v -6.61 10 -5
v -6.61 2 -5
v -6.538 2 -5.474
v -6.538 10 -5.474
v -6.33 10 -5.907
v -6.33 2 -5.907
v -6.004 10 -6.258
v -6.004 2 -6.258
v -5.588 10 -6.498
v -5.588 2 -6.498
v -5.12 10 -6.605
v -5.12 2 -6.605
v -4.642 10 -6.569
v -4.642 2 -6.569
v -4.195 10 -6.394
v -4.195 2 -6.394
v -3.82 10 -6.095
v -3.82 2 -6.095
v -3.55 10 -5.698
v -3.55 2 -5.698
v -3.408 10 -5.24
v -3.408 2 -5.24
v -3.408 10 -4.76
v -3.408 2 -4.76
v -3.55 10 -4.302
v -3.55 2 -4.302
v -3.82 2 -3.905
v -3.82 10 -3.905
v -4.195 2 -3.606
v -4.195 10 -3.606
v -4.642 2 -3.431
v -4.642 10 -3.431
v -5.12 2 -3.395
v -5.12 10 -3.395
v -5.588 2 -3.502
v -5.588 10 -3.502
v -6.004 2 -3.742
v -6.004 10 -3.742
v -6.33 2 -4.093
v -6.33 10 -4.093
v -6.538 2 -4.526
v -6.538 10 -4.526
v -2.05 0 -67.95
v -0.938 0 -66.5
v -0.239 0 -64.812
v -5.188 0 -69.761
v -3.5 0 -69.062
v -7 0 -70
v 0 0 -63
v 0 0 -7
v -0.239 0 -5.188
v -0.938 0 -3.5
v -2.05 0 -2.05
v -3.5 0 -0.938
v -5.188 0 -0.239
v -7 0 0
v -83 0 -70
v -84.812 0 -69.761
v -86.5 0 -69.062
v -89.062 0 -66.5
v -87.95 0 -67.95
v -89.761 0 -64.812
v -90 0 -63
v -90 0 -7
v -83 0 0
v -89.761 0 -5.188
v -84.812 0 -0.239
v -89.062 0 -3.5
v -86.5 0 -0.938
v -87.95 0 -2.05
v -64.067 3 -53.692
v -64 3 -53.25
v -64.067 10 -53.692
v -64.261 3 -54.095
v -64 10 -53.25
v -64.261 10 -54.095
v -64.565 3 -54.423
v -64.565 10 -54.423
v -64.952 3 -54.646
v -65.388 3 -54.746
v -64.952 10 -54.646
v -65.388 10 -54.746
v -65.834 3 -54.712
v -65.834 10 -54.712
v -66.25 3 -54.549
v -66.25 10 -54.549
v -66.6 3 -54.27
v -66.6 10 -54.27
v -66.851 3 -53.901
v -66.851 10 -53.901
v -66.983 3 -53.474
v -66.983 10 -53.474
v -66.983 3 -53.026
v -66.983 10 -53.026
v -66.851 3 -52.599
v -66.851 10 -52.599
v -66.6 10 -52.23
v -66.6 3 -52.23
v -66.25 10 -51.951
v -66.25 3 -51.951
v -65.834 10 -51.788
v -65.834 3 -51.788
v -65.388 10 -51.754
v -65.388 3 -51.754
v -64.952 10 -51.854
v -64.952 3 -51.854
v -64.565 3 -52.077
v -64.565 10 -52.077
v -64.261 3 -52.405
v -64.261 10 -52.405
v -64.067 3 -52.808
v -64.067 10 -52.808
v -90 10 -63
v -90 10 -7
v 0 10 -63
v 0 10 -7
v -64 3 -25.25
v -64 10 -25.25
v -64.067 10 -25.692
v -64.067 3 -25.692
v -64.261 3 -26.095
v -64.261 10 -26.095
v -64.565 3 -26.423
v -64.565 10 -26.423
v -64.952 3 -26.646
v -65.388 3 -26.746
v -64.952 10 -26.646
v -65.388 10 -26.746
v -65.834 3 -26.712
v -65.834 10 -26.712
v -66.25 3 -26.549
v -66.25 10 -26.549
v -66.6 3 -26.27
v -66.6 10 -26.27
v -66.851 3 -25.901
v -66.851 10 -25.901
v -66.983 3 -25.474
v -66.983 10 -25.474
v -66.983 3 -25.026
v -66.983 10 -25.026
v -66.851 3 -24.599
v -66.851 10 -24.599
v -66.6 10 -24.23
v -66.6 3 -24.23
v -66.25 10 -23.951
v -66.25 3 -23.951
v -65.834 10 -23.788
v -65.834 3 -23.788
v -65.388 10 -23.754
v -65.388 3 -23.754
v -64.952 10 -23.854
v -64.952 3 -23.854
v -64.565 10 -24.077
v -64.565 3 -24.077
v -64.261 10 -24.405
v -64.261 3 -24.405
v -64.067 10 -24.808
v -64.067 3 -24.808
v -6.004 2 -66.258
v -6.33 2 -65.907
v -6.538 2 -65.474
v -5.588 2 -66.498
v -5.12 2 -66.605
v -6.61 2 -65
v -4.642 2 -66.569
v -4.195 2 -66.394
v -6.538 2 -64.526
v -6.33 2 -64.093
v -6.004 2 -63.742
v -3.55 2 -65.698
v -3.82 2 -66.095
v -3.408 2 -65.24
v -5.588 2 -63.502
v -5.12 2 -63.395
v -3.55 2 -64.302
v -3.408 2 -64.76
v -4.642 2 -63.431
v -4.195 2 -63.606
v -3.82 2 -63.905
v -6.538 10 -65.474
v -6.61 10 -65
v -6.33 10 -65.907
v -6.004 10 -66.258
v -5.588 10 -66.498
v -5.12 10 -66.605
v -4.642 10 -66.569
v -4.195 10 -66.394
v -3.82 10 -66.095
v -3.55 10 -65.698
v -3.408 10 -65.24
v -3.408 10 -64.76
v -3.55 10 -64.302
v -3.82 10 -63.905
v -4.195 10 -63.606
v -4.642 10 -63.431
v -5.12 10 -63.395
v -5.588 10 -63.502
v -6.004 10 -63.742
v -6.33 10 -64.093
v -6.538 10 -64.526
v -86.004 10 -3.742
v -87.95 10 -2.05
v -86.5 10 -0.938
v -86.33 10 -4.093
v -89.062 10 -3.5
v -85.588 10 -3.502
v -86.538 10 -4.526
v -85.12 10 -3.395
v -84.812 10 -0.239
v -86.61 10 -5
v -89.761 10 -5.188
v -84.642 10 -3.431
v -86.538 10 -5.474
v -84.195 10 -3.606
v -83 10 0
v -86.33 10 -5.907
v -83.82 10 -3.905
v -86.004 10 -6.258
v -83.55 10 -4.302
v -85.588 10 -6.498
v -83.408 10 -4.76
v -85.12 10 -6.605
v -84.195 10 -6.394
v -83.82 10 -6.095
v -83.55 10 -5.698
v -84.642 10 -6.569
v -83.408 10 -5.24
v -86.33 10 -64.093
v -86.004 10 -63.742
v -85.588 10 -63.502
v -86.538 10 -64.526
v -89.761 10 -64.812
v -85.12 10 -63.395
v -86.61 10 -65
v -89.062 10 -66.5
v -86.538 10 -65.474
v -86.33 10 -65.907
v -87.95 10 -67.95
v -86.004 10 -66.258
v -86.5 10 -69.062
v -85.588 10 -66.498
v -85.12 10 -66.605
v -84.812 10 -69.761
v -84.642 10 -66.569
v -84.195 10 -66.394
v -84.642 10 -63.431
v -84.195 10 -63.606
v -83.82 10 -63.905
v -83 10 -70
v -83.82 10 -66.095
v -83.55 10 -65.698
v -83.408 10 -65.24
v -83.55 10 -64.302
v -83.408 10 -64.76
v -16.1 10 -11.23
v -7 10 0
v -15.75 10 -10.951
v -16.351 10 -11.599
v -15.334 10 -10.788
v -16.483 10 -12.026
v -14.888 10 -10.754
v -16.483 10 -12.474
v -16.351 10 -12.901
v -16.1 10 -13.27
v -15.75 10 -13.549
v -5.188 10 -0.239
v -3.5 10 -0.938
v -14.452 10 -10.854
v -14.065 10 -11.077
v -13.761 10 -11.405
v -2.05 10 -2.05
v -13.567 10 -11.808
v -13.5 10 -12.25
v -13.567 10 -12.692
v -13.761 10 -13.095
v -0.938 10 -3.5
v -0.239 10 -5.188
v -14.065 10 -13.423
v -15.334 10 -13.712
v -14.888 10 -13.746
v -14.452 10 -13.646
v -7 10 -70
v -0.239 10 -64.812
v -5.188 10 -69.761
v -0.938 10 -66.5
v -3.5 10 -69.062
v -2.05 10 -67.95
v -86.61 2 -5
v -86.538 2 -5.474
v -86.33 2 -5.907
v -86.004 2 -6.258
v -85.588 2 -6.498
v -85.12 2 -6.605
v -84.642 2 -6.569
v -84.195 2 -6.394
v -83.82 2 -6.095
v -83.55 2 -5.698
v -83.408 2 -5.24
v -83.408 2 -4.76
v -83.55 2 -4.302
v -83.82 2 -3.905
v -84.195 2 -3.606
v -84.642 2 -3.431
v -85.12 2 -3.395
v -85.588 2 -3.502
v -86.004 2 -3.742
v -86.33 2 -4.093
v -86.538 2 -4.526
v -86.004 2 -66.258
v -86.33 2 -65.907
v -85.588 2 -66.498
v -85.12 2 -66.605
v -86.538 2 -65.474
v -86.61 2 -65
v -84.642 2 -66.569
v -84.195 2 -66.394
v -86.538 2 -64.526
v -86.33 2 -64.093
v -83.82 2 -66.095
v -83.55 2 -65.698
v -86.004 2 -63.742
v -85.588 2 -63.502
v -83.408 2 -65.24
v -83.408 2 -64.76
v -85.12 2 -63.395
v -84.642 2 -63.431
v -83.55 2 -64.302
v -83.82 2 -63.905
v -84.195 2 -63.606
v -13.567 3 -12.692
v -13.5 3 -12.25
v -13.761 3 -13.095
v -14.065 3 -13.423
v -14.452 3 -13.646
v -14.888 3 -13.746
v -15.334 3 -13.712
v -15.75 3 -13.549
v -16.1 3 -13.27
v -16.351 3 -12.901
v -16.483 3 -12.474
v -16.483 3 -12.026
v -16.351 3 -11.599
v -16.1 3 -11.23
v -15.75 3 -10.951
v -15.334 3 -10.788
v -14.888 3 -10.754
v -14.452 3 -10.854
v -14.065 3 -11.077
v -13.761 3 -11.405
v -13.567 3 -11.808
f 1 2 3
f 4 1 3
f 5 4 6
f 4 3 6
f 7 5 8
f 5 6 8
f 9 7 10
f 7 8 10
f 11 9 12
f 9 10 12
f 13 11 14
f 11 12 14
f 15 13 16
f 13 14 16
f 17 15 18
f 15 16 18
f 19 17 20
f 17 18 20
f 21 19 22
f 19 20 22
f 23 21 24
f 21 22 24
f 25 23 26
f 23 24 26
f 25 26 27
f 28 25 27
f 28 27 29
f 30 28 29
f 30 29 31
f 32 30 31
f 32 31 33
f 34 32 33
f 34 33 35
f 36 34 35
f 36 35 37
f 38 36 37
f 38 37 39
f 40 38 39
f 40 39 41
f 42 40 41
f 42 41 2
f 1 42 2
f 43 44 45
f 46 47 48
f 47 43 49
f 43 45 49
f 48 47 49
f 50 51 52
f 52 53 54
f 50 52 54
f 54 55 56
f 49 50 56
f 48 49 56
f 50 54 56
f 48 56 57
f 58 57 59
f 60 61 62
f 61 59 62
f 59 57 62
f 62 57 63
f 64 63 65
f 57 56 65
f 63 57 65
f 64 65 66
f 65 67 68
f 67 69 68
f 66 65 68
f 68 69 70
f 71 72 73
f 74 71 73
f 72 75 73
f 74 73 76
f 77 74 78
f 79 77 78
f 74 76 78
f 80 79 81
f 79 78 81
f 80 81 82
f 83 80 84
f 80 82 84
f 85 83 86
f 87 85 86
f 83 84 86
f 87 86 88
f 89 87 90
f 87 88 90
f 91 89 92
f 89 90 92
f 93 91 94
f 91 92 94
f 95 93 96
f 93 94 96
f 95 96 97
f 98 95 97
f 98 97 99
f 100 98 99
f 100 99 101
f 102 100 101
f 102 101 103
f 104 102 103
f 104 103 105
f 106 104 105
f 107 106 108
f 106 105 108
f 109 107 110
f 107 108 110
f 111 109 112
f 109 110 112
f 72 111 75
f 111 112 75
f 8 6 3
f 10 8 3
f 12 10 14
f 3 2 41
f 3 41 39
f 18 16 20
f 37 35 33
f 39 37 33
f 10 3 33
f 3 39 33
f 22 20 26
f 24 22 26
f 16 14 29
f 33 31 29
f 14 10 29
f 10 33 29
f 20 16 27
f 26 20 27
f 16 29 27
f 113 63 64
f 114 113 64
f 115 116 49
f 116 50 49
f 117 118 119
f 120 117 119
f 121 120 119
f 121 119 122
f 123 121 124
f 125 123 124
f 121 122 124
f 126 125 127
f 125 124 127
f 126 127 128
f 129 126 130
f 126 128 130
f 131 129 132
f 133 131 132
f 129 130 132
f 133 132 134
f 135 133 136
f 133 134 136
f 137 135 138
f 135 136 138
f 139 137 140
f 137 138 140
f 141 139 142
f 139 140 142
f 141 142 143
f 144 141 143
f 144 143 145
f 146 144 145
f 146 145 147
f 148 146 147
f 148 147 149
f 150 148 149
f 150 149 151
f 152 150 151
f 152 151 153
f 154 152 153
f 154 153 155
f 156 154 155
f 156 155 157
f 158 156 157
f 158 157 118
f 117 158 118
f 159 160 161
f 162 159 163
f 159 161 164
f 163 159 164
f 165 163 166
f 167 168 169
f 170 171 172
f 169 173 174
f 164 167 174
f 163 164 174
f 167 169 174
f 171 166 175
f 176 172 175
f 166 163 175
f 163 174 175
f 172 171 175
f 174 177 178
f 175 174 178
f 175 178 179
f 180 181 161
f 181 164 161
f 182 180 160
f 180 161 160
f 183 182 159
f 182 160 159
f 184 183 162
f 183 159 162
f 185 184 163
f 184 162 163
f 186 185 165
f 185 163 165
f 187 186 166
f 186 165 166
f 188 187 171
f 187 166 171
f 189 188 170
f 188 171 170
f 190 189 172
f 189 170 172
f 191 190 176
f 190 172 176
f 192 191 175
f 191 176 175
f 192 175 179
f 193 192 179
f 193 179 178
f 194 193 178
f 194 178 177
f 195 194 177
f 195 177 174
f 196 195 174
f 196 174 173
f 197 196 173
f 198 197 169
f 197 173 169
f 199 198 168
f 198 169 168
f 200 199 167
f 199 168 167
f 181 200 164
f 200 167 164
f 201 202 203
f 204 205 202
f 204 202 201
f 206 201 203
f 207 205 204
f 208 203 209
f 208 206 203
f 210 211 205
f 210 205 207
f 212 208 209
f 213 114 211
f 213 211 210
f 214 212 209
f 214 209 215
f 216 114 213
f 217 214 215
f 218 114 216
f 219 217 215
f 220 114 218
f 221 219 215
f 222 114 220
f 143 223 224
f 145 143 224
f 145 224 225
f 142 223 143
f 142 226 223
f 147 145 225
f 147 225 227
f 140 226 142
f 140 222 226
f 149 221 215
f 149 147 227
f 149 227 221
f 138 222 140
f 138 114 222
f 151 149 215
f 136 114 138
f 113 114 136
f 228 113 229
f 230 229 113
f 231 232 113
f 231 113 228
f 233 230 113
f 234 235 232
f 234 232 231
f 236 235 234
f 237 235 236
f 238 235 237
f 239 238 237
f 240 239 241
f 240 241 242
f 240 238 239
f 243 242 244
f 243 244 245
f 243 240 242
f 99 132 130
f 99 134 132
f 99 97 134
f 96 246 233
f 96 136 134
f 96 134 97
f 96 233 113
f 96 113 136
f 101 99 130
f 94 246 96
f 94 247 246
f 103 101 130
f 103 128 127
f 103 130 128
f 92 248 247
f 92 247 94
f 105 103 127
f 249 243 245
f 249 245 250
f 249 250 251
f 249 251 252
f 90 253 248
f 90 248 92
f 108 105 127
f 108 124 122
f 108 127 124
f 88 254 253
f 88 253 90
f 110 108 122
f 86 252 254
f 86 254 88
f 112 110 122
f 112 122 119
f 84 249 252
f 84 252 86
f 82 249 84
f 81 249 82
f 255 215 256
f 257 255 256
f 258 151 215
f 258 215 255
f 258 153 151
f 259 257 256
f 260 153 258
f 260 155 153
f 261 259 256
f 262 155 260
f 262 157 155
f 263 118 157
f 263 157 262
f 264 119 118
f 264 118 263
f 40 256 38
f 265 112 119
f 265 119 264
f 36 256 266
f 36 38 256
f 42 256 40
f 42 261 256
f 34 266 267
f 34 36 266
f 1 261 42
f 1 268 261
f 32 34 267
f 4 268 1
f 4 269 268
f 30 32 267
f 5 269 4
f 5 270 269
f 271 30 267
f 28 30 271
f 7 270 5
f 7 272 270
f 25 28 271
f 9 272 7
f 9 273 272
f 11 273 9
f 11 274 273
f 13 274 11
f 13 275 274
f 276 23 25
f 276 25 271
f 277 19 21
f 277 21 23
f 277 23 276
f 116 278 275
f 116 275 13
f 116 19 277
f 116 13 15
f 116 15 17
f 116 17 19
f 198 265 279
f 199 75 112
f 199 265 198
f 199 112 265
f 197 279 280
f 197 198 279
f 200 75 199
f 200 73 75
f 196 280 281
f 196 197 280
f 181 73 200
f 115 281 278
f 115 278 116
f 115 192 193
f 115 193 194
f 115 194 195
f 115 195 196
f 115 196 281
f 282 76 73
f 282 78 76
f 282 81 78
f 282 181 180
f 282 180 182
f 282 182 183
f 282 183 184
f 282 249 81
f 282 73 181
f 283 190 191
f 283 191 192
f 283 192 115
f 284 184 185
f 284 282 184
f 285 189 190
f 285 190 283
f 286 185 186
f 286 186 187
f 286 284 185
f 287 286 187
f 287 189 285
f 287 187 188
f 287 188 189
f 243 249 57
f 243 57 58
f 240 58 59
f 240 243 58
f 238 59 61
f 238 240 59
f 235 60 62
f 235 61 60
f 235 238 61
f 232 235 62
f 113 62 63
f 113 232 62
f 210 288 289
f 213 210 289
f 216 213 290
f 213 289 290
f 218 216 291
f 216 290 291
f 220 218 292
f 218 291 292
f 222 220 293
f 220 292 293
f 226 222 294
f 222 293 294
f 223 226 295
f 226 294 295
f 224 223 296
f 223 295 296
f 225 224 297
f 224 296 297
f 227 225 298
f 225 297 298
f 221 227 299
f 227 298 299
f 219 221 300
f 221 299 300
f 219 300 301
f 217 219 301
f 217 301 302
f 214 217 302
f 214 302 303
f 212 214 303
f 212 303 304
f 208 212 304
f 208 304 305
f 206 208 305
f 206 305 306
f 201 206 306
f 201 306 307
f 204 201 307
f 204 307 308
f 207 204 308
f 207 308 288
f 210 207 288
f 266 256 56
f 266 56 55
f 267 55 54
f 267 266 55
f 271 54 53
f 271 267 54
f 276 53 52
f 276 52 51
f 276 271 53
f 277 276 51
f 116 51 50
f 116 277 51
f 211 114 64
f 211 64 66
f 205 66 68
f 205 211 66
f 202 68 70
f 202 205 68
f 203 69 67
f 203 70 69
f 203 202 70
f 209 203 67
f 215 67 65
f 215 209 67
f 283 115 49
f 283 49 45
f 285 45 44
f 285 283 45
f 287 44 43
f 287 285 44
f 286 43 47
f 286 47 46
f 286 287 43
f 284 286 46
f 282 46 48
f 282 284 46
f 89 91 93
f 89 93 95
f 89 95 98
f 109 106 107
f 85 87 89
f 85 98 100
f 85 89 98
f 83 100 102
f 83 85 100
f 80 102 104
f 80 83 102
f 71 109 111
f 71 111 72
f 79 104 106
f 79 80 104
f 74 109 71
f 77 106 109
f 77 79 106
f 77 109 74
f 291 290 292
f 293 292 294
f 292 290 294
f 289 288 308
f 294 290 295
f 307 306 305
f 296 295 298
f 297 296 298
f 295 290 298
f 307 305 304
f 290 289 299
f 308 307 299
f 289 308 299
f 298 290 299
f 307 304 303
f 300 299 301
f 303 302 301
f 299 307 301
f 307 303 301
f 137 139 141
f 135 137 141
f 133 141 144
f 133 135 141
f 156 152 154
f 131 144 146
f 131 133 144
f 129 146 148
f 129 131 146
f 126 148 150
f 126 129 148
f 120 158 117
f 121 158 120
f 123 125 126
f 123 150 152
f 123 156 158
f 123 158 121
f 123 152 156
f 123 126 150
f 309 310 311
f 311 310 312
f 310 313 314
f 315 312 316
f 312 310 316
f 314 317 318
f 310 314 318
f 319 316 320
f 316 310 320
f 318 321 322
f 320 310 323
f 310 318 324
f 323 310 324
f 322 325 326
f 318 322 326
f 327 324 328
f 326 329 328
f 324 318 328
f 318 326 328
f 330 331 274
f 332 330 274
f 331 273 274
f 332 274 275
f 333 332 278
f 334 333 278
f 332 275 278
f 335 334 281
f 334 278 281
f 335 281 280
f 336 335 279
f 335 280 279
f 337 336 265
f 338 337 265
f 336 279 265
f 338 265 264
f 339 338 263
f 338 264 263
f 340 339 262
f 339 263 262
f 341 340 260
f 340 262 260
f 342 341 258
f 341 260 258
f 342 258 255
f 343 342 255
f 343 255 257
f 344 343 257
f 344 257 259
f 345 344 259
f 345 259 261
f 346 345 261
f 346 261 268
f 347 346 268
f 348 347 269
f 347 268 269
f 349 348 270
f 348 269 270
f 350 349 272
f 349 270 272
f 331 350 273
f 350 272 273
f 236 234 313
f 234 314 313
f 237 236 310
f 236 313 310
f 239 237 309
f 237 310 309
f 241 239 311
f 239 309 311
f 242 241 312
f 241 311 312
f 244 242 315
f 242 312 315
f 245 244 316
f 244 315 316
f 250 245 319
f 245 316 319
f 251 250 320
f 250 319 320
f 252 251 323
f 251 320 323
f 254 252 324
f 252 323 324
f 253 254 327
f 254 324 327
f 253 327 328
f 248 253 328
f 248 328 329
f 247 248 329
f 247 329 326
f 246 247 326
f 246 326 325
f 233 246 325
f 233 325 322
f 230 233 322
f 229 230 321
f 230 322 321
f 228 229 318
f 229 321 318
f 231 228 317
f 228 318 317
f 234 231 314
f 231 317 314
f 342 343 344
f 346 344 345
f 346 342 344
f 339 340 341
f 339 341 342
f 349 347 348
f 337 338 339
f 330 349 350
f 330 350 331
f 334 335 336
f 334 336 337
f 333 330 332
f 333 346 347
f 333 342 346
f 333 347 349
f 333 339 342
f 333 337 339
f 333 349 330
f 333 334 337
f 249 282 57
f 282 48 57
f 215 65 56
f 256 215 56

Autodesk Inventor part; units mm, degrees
ref_plane "YZ Plane" through (0, 0, 0) normal (1, 0, 0) x (0, 1, 0)
ref_plane "XZ Plane" through (0, 0, 0) normal (0, 1, 0) x (-1, 0, 0)
ref_plane "XY Plane" through (0, 0, 0) normal (0, 0, 1) x (1, 0, 0)
sketch "Sketch1" plane through (0, 0, 0) normal (0, 1, 0) x (-1, 0, 0)
  line L0 (0, 0) -> (0, -70)
  line L1 (0, -70) -> (90, -70)
  line L2 (90, -70) -> (90, 0)
  line L3 (90, 0) -> (0, 0)
  circle A0 centre (85, -65) radius 1.6095
  circle A1 centre (85, -5) radius 1.6095
  circle A2 centre (85, -5) radius 1.6095
  circle A3 centre (85, -65) radius 1.6095
  circle A4 centre (5, -65) radius 1.6095
  circle A5 centre (5, -5) radius 1.6095
  circle A6 centre (5, -65) radius 1.6095
  circle A7 centre (5, -5) radius 1.6095
  dimension "d0" = 70
  dimension "d1" = 90
  dimension "d5" = 5
  dimension "d6" = 3.2191
extrude "Extrusion1" add sketch "Sketch1" along normal blind 15
sketch "Sketch2" plane through (0, 15, 0) normal (0, 1, 0) x (1, 0, 0)
  line L0 (-90, 70) -> (-90, 0) projected
  line L1 (-90, 0) -> (0, 0) projected
  line L2 (-90, 0) -> (0, 0)
  line L3 (0, 70) -> (-90, 70) projected
  line L4 (0, 0) -> (0, 70)
  line L5 (0, 70) -> (-90, 70)
  line L6 (-90, 70) -> (-90, 0)
extrude "Extrusion2" cut sketch "Sketch2" against normal blind 5
fillet "Fillet1" radius 7 4 edges at (-90, 5, -70) (-90, 5, 0) (0, 5, -70) (0, 5, 0)
sketch "Sketch3" plane through (0, 0, 0) normal (0, -1, 0) x (1, 0, 0)
  circle A0 centre (-85, -65) radius 1.6095 projected
  circle A1 centre (-85, -65) radius 1.6095
  circle A2 centre (-85, -5) radius 1.6095 projected
  circle A3 centre (-85, -5) radius 1.6095
  circle A4 centre (-5, -5) radius 1.6095 projected
  circle A5 centre (-5, -5) radius 1.6095
  circle A6 centre (-5, -65) radius 1.6095 projected
  circle A7 centre (-5, -65) radius 1.6095
  point P0 (0, 0)
extrude "Extrusion3" add sketch "Sketch3" against normal blind 2
sketch "Sketch4" plane through (0, 10, 0) normal (0, 1, 0) x (1, 0, 0)
  point P0 (0, 0)
sketch "Sketch5" plane through (0, 10, 0) normal (0, 1, 0) x (1, 0, 0)
  circle A0 centre (-15, 12.25) radius 1.5
  circle A1 centre (-65.5, 53.25) radius 1.5
  circle A2 centre (-65.5, 25.25) radius 1.5
  point P0 (0, 0)
extrude "Extrusion4" cut sketch "Sketch5" against normal blind 7
properties part number "Módulo de fixação Arduíno" material "PPS Plastic"
